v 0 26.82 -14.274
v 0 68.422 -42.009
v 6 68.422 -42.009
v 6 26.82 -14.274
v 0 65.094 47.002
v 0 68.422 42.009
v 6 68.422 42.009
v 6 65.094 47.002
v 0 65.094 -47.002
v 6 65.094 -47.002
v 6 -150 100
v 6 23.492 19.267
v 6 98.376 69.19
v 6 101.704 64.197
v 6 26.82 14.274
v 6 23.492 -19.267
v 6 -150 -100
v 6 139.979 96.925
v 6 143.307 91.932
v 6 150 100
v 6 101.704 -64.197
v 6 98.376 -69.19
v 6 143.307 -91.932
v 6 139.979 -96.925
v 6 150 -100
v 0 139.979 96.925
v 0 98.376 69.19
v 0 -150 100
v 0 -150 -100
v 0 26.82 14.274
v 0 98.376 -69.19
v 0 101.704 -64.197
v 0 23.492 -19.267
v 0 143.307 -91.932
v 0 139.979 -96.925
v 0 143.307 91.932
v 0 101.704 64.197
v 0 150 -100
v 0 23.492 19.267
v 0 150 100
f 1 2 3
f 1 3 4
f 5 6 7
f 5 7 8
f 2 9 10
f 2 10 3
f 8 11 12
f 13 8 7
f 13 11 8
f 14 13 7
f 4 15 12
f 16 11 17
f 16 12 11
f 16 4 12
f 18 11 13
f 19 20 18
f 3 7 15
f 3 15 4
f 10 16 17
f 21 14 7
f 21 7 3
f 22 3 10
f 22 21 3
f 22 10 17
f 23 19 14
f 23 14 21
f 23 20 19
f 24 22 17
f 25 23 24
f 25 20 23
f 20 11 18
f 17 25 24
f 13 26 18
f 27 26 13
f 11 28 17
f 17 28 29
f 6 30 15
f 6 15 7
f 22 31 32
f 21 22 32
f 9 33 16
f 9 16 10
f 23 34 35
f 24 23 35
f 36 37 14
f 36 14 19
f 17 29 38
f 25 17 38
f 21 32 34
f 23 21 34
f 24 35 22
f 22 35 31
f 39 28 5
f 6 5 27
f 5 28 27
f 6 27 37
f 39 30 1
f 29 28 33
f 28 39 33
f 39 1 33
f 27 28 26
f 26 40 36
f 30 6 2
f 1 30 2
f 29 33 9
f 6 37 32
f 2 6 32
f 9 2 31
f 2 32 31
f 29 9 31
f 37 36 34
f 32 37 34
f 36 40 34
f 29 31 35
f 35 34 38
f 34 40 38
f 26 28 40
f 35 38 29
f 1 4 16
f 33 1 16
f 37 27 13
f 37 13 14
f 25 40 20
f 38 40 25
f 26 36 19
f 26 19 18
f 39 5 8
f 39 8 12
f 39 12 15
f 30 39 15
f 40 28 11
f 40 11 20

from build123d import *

# Parameters (mm, degrees)
SKETCH_1_W      = 200
SKETCH_1_H      = 300
EXTRUDE_1_DEPTH = 6


with BuildPart() as part:
    # Эскиз1 → Бобышка-Вытянуть1 (new body)
    with BuildSketch(Plane(origin=(0, 0, 0), x_dir=(0, 0, -1), z_dir=(1, 0, 0))):
        Rectangle(SKETCH_1_W, SKETCH_1_H)
        Polygon((-91.932327425, 143.306818051), (-96.924629192, 139.978616874), (-69.18961938, 98.376102157), (-64.197317614, 101.704303335), align=None, mode=Mode.SUBTRACT)
        Polygon((-19.26660172, 23.491575667), (-14.274299954, 26.819776844), (-42.009309765, 68.422291561), (-47.001611531, 65.094090384), align=None, mode=Mode.SUBTRACT)
        Polygon((19.26660172, 23.491575667), (47.001611531, 65.094090384), (42.009309765, 68.422291561), (14.274299954, 26.819776844), align=None, mode=Mode.SUBTRACT)
        Polygon((96.924629192, 139.978616874), (69.18961938, 98.376102157), (64.197317614, 101.704303335), (91.932327425, 143.306818051), align=None, mode=Mode.SUBTRACT)
    extrude(amount=EXTRUDE_1_DEPTH)


solid = part.part
